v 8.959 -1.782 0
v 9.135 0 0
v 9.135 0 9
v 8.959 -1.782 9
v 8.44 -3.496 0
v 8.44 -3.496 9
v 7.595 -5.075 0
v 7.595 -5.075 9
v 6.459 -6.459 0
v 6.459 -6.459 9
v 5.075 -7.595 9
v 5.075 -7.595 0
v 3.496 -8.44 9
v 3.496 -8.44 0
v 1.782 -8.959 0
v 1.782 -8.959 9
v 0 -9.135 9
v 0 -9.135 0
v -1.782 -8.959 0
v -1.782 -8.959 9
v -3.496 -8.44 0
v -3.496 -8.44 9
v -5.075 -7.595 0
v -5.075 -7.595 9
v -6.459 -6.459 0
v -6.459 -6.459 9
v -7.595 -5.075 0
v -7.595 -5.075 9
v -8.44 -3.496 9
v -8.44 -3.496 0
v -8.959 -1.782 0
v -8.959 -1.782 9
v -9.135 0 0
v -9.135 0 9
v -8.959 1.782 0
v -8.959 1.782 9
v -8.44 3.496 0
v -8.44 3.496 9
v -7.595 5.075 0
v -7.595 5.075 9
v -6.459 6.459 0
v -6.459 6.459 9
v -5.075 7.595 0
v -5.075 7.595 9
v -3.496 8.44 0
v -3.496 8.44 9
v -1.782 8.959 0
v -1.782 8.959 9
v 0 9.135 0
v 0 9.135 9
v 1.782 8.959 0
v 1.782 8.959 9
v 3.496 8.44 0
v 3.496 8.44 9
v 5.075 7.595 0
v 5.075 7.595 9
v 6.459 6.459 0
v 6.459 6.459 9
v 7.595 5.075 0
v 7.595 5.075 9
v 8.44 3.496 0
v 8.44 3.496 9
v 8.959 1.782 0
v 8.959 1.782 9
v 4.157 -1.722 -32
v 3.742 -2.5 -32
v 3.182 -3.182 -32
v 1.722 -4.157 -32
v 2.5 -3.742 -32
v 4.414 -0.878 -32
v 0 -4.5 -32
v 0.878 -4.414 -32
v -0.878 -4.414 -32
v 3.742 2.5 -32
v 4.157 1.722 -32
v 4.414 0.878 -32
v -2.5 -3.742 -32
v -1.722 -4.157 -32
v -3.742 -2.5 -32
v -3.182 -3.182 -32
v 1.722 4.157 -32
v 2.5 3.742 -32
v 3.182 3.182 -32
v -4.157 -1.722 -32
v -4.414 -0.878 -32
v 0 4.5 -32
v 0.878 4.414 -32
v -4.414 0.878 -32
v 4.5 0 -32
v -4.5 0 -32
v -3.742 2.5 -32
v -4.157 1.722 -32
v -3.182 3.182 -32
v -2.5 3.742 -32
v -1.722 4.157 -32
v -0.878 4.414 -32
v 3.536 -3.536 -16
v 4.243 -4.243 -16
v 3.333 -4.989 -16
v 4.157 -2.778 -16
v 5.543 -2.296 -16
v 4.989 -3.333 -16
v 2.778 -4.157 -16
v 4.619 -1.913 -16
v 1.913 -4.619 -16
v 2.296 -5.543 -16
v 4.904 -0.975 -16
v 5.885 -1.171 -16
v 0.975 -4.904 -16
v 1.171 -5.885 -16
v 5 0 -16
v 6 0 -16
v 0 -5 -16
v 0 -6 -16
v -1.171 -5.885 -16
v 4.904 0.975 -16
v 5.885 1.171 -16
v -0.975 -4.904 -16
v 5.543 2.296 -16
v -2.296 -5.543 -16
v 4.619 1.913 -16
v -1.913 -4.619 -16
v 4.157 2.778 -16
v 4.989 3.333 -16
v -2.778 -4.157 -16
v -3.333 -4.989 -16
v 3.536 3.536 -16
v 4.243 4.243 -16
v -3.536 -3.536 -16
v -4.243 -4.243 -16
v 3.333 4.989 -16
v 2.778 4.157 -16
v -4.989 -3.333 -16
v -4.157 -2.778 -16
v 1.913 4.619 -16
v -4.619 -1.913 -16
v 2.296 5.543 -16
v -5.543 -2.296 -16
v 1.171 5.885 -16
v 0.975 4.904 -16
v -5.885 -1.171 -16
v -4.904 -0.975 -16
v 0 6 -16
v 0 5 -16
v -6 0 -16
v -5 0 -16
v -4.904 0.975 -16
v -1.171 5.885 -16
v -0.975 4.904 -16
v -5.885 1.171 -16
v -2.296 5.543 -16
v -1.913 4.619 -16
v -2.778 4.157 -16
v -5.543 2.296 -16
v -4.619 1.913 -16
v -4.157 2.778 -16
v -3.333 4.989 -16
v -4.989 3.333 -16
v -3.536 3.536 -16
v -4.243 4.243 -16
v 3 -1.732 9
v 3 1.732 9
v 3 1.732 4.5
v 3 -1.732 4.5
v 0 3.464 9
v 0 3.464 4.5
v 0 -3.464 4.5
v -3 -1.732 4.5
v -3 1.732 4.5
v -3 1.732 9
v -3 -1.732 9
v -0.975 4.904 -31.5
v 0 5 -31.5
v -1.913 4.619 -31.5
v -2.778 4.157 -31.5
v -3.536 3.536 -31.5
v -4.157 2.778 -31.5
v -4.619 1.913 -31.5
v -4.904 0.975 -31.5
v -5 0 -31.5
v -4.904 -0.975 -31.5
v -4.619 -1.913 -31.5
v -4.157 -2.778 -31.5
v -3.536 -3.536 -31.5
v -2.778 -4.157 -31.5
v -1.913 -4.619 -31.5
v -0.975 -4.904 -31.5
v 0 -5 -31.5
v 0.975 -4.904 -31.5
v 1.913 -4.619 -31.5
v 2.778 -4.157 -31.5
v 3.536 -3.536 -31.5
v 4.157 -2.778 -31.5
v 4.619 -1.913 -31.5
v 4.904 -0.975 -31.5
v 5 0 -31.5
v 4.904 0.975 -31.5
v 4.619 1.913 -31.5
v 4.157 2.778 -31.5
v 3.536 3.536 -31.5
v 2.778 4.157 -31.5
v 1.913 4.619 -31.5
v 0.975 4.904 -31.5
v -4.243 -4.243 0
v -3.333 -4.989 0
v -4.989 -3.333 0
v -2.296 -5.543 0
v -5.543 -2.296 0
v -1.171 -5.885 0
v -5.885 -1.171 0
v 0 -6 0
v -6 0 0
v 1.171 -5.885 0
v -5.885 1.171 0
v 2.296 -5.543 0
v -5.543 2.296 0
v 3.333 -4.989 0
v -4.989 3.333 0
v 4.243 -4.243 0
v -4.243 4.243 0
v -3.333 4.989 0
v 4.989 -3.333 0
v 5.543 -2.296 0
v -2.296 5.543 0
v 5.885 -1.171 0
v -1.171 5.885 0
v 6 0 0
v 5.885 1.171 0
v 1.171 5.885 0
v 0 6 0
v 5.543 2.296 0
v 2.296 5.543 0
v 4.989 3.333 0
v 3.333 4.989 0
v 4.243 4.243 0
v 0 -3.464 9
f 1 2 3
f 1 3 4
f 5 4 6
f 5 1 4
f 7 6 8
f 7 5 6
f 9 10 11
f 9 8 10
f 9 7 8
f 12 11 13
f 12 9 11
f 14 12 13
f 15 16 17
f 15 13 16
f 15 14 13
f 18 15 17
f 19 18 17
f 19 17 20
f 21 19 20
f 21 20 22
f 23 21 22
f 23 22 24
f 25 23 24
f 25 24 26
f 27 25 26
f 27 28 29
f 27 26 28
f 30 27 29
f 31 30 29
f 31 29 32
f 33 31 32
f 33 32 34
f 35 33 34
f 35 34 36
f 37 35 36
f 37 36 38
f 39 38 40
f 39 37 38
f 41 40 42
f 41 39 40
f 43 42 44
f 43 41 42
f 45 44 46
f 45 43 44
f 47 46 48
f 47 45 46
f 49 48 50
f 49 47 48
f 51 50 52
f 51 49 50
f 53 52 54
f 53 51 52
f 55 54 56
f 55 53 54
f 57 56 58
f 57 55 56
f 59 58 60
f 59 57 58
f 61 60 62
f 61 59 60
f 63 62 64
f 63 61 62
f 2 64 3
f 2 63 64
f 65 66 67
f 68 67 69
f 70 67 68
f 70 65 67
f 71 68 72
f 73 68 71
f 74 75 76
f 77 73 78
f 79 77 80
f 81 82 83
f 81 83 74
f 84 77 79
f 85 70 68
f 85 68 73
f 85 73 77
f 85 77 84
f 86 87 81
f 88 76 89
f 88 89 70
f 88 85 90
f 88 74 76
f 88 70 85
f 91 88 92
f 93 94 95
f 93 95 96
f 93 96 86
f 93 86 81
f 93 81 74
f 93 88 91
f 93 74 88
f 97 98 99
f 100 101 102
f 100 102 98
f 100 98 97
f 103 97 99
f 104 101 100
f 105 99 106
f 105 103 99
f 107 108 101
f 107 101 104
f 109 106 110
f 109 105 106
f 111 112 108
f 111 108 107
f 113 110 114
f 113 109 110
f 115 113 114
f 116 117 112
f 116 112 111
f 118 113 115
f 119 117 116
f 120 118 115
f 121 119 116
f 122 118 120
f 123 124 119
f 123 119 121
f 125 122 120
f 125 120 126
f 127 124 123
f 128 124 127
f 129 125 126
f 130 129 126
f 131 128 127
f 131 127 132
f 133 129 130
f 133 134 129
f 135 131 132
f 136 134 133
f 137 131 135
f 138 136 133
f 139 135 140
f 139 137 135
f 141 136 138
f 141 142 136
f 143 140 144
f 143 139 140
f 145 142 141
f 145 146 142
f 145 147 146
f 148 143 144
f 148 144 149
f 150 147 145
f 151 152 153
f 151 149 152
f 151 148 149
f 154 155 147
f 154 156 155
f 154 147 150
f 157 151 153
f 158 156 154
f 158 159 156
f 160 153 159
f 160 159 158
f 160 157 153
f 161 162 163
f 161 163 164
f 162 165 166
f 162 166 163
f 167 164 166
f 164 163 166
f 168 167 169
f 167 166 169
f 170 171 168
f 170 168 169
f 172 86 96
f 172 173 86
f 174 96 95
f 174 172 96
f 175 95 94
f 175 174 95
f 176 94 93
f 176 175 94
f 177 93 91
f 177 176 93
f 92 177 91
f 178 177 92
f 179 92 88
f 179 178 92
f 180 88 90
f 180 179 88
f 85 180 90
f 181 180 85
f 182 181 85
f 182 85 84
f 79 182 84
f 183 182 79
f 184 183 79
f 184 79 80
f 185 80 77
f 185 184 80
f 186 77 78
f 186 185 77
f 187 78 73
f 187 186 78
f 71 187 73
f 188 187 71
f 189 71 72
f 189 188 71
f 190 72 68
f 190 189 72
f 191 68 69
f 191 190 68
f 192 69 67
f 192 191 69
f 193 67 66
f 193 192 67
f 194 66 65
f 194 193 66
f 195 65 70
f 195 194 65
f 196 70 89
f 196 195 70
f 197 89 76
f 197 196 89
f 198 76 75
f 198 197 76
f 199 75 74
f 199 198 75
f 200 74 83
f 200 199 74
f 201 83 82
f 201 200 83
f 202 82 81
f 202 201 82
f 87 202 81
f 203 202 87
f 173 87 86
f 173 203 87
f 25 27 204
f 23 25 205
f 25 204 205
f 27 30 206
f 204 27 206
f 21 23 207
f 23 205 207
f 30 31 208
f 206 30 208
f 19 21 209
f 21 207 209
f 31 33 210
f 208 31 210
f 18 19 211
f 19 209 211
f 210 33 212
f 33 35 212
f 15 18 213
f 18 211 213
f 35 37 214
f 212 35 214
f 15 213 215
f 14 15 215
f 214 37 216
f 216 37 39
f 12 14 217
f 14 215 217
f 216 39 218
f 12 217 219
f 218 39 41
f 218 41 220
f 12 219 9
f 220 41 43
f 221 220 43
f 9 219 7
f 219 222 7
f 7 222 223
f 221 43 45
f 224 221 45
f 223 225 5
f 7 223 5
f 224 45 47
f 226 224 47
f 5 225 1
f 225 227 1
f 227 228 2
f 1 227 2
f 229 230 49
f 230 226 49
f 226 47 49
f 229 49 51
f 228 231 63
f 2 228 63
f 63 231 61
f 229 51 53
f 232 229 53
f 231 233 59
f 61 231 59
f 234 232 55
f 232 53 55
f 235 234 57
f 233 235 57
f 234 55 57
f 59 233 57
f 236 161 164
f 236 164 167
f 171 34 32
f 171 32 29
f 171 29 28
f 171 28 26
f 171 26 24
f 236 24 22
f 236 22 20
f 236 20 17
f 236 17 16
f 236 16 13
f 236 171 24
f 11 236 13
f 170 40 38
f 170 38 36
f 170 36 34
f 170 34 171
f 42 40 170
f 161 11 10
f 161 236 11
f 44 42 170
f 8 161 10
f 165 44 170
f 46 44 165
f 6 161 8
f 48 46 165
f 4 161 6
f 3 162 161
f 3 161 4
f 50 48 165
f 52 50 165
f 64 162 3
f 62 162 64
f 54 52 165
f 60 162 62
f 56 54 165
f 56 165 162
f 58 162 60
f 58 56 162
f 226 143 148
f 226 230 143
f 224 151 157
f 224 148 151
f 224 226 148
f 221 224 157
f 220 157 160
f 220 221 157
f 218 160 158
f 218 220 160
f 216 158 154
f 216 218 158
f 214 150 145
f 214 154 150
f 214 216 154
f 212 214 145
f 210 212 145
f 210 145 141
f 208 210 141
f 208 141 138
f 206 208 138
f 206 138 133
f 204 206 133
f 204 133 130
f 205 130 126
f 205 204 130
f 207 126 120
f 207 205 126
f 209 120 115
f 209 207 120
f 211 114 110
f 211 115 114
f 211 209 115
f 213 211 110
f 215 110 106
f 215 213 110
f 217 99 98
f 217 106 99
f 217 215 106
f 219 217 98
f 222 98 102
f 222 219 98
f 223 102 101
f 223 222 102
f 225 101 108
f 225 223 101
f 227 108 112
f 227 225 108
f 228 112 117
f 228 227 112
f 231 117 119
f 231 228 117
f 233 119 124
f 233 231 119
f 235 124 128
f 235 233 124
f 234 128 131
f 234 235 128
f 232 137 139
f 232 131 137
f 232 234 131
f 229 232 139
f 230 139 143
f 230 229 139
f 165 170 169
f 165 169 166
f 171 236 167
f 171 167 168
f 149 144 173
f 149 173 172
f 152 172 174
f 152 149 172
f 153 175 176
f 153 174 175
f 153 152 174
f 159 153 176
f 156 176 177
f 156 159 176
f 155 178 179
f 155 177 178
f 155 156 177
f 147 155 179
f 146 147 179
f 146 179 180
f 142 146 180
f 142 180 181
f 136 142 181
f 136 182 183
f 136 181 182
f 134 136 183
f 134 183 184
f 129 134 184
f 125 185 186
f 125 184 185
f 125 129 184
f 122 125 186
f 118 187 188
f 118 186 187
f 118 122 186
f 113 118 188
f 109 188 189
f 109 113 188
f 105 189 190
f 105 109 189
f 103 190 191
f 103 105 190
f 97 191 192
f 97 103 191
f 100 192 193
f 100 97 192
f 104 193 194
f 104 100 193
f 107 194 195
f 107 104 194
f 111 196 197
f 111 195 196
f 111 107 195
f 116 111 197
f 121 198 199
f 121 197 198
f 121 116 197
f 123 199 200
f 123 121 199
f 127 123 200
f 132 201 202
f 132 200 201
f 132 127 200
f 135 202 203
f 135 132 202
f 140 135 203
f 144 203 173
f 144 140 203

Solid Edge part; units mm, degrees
sketch "Sketch1" plane through (0, 0, 0) normal (0, 0, 1) x (1, 0, 0)
  circle A0 centre (0, 0) radius 9.135
  dimension "D1" = 18.27
extrude "Protrusion1" add sketch "Sketch1" along normal blind 9
sketch "Sketch2" plane through (0, 0, 9) normal (0, 0, 1) x (1, 0, 0)
  line L0 (0, -3.4641) -> (-3, -1.7321)
  line L1 (-3, -1.7321) -> (-3, 1.7321)
  line L2 (-3, 1.7321) -> (0, 3.4641)
  line L3 (0, 3.4641) -> (3, 1.7321)
  line L4 (3, 1.7321) -> (3, -1.7321)
  line L5 (3, -1.7321) -> (0, -3.4641)
  dimension "D1" = 6
extrude "Cutout1" cut sketch "Sketch2" against normal blind 4.5
sketch "Sketch3" plane through (0, 0, 0) normal (0, 0, -1) x (0, 1, 0)
  circle A0 centre (0, 0) radius 6
  dimension "D1" = 12
extrude "Protrusion2" add sketch "Sketch3" along normal blind 16
sketch "Sketch4" plane through (0, 0, -16) normal (0, 0, -1) x (0, 1, 0)
  circle A0 centre (0, 0) radius 5
  dimension "D1" = 10
extrude "Protrusion3" add sketch "Sketch4" along normal blind 16
chamfer "Chamfer1" distance 0.5 angle 45 1 edges at (0, -5, -32)
properties part number "221437"
